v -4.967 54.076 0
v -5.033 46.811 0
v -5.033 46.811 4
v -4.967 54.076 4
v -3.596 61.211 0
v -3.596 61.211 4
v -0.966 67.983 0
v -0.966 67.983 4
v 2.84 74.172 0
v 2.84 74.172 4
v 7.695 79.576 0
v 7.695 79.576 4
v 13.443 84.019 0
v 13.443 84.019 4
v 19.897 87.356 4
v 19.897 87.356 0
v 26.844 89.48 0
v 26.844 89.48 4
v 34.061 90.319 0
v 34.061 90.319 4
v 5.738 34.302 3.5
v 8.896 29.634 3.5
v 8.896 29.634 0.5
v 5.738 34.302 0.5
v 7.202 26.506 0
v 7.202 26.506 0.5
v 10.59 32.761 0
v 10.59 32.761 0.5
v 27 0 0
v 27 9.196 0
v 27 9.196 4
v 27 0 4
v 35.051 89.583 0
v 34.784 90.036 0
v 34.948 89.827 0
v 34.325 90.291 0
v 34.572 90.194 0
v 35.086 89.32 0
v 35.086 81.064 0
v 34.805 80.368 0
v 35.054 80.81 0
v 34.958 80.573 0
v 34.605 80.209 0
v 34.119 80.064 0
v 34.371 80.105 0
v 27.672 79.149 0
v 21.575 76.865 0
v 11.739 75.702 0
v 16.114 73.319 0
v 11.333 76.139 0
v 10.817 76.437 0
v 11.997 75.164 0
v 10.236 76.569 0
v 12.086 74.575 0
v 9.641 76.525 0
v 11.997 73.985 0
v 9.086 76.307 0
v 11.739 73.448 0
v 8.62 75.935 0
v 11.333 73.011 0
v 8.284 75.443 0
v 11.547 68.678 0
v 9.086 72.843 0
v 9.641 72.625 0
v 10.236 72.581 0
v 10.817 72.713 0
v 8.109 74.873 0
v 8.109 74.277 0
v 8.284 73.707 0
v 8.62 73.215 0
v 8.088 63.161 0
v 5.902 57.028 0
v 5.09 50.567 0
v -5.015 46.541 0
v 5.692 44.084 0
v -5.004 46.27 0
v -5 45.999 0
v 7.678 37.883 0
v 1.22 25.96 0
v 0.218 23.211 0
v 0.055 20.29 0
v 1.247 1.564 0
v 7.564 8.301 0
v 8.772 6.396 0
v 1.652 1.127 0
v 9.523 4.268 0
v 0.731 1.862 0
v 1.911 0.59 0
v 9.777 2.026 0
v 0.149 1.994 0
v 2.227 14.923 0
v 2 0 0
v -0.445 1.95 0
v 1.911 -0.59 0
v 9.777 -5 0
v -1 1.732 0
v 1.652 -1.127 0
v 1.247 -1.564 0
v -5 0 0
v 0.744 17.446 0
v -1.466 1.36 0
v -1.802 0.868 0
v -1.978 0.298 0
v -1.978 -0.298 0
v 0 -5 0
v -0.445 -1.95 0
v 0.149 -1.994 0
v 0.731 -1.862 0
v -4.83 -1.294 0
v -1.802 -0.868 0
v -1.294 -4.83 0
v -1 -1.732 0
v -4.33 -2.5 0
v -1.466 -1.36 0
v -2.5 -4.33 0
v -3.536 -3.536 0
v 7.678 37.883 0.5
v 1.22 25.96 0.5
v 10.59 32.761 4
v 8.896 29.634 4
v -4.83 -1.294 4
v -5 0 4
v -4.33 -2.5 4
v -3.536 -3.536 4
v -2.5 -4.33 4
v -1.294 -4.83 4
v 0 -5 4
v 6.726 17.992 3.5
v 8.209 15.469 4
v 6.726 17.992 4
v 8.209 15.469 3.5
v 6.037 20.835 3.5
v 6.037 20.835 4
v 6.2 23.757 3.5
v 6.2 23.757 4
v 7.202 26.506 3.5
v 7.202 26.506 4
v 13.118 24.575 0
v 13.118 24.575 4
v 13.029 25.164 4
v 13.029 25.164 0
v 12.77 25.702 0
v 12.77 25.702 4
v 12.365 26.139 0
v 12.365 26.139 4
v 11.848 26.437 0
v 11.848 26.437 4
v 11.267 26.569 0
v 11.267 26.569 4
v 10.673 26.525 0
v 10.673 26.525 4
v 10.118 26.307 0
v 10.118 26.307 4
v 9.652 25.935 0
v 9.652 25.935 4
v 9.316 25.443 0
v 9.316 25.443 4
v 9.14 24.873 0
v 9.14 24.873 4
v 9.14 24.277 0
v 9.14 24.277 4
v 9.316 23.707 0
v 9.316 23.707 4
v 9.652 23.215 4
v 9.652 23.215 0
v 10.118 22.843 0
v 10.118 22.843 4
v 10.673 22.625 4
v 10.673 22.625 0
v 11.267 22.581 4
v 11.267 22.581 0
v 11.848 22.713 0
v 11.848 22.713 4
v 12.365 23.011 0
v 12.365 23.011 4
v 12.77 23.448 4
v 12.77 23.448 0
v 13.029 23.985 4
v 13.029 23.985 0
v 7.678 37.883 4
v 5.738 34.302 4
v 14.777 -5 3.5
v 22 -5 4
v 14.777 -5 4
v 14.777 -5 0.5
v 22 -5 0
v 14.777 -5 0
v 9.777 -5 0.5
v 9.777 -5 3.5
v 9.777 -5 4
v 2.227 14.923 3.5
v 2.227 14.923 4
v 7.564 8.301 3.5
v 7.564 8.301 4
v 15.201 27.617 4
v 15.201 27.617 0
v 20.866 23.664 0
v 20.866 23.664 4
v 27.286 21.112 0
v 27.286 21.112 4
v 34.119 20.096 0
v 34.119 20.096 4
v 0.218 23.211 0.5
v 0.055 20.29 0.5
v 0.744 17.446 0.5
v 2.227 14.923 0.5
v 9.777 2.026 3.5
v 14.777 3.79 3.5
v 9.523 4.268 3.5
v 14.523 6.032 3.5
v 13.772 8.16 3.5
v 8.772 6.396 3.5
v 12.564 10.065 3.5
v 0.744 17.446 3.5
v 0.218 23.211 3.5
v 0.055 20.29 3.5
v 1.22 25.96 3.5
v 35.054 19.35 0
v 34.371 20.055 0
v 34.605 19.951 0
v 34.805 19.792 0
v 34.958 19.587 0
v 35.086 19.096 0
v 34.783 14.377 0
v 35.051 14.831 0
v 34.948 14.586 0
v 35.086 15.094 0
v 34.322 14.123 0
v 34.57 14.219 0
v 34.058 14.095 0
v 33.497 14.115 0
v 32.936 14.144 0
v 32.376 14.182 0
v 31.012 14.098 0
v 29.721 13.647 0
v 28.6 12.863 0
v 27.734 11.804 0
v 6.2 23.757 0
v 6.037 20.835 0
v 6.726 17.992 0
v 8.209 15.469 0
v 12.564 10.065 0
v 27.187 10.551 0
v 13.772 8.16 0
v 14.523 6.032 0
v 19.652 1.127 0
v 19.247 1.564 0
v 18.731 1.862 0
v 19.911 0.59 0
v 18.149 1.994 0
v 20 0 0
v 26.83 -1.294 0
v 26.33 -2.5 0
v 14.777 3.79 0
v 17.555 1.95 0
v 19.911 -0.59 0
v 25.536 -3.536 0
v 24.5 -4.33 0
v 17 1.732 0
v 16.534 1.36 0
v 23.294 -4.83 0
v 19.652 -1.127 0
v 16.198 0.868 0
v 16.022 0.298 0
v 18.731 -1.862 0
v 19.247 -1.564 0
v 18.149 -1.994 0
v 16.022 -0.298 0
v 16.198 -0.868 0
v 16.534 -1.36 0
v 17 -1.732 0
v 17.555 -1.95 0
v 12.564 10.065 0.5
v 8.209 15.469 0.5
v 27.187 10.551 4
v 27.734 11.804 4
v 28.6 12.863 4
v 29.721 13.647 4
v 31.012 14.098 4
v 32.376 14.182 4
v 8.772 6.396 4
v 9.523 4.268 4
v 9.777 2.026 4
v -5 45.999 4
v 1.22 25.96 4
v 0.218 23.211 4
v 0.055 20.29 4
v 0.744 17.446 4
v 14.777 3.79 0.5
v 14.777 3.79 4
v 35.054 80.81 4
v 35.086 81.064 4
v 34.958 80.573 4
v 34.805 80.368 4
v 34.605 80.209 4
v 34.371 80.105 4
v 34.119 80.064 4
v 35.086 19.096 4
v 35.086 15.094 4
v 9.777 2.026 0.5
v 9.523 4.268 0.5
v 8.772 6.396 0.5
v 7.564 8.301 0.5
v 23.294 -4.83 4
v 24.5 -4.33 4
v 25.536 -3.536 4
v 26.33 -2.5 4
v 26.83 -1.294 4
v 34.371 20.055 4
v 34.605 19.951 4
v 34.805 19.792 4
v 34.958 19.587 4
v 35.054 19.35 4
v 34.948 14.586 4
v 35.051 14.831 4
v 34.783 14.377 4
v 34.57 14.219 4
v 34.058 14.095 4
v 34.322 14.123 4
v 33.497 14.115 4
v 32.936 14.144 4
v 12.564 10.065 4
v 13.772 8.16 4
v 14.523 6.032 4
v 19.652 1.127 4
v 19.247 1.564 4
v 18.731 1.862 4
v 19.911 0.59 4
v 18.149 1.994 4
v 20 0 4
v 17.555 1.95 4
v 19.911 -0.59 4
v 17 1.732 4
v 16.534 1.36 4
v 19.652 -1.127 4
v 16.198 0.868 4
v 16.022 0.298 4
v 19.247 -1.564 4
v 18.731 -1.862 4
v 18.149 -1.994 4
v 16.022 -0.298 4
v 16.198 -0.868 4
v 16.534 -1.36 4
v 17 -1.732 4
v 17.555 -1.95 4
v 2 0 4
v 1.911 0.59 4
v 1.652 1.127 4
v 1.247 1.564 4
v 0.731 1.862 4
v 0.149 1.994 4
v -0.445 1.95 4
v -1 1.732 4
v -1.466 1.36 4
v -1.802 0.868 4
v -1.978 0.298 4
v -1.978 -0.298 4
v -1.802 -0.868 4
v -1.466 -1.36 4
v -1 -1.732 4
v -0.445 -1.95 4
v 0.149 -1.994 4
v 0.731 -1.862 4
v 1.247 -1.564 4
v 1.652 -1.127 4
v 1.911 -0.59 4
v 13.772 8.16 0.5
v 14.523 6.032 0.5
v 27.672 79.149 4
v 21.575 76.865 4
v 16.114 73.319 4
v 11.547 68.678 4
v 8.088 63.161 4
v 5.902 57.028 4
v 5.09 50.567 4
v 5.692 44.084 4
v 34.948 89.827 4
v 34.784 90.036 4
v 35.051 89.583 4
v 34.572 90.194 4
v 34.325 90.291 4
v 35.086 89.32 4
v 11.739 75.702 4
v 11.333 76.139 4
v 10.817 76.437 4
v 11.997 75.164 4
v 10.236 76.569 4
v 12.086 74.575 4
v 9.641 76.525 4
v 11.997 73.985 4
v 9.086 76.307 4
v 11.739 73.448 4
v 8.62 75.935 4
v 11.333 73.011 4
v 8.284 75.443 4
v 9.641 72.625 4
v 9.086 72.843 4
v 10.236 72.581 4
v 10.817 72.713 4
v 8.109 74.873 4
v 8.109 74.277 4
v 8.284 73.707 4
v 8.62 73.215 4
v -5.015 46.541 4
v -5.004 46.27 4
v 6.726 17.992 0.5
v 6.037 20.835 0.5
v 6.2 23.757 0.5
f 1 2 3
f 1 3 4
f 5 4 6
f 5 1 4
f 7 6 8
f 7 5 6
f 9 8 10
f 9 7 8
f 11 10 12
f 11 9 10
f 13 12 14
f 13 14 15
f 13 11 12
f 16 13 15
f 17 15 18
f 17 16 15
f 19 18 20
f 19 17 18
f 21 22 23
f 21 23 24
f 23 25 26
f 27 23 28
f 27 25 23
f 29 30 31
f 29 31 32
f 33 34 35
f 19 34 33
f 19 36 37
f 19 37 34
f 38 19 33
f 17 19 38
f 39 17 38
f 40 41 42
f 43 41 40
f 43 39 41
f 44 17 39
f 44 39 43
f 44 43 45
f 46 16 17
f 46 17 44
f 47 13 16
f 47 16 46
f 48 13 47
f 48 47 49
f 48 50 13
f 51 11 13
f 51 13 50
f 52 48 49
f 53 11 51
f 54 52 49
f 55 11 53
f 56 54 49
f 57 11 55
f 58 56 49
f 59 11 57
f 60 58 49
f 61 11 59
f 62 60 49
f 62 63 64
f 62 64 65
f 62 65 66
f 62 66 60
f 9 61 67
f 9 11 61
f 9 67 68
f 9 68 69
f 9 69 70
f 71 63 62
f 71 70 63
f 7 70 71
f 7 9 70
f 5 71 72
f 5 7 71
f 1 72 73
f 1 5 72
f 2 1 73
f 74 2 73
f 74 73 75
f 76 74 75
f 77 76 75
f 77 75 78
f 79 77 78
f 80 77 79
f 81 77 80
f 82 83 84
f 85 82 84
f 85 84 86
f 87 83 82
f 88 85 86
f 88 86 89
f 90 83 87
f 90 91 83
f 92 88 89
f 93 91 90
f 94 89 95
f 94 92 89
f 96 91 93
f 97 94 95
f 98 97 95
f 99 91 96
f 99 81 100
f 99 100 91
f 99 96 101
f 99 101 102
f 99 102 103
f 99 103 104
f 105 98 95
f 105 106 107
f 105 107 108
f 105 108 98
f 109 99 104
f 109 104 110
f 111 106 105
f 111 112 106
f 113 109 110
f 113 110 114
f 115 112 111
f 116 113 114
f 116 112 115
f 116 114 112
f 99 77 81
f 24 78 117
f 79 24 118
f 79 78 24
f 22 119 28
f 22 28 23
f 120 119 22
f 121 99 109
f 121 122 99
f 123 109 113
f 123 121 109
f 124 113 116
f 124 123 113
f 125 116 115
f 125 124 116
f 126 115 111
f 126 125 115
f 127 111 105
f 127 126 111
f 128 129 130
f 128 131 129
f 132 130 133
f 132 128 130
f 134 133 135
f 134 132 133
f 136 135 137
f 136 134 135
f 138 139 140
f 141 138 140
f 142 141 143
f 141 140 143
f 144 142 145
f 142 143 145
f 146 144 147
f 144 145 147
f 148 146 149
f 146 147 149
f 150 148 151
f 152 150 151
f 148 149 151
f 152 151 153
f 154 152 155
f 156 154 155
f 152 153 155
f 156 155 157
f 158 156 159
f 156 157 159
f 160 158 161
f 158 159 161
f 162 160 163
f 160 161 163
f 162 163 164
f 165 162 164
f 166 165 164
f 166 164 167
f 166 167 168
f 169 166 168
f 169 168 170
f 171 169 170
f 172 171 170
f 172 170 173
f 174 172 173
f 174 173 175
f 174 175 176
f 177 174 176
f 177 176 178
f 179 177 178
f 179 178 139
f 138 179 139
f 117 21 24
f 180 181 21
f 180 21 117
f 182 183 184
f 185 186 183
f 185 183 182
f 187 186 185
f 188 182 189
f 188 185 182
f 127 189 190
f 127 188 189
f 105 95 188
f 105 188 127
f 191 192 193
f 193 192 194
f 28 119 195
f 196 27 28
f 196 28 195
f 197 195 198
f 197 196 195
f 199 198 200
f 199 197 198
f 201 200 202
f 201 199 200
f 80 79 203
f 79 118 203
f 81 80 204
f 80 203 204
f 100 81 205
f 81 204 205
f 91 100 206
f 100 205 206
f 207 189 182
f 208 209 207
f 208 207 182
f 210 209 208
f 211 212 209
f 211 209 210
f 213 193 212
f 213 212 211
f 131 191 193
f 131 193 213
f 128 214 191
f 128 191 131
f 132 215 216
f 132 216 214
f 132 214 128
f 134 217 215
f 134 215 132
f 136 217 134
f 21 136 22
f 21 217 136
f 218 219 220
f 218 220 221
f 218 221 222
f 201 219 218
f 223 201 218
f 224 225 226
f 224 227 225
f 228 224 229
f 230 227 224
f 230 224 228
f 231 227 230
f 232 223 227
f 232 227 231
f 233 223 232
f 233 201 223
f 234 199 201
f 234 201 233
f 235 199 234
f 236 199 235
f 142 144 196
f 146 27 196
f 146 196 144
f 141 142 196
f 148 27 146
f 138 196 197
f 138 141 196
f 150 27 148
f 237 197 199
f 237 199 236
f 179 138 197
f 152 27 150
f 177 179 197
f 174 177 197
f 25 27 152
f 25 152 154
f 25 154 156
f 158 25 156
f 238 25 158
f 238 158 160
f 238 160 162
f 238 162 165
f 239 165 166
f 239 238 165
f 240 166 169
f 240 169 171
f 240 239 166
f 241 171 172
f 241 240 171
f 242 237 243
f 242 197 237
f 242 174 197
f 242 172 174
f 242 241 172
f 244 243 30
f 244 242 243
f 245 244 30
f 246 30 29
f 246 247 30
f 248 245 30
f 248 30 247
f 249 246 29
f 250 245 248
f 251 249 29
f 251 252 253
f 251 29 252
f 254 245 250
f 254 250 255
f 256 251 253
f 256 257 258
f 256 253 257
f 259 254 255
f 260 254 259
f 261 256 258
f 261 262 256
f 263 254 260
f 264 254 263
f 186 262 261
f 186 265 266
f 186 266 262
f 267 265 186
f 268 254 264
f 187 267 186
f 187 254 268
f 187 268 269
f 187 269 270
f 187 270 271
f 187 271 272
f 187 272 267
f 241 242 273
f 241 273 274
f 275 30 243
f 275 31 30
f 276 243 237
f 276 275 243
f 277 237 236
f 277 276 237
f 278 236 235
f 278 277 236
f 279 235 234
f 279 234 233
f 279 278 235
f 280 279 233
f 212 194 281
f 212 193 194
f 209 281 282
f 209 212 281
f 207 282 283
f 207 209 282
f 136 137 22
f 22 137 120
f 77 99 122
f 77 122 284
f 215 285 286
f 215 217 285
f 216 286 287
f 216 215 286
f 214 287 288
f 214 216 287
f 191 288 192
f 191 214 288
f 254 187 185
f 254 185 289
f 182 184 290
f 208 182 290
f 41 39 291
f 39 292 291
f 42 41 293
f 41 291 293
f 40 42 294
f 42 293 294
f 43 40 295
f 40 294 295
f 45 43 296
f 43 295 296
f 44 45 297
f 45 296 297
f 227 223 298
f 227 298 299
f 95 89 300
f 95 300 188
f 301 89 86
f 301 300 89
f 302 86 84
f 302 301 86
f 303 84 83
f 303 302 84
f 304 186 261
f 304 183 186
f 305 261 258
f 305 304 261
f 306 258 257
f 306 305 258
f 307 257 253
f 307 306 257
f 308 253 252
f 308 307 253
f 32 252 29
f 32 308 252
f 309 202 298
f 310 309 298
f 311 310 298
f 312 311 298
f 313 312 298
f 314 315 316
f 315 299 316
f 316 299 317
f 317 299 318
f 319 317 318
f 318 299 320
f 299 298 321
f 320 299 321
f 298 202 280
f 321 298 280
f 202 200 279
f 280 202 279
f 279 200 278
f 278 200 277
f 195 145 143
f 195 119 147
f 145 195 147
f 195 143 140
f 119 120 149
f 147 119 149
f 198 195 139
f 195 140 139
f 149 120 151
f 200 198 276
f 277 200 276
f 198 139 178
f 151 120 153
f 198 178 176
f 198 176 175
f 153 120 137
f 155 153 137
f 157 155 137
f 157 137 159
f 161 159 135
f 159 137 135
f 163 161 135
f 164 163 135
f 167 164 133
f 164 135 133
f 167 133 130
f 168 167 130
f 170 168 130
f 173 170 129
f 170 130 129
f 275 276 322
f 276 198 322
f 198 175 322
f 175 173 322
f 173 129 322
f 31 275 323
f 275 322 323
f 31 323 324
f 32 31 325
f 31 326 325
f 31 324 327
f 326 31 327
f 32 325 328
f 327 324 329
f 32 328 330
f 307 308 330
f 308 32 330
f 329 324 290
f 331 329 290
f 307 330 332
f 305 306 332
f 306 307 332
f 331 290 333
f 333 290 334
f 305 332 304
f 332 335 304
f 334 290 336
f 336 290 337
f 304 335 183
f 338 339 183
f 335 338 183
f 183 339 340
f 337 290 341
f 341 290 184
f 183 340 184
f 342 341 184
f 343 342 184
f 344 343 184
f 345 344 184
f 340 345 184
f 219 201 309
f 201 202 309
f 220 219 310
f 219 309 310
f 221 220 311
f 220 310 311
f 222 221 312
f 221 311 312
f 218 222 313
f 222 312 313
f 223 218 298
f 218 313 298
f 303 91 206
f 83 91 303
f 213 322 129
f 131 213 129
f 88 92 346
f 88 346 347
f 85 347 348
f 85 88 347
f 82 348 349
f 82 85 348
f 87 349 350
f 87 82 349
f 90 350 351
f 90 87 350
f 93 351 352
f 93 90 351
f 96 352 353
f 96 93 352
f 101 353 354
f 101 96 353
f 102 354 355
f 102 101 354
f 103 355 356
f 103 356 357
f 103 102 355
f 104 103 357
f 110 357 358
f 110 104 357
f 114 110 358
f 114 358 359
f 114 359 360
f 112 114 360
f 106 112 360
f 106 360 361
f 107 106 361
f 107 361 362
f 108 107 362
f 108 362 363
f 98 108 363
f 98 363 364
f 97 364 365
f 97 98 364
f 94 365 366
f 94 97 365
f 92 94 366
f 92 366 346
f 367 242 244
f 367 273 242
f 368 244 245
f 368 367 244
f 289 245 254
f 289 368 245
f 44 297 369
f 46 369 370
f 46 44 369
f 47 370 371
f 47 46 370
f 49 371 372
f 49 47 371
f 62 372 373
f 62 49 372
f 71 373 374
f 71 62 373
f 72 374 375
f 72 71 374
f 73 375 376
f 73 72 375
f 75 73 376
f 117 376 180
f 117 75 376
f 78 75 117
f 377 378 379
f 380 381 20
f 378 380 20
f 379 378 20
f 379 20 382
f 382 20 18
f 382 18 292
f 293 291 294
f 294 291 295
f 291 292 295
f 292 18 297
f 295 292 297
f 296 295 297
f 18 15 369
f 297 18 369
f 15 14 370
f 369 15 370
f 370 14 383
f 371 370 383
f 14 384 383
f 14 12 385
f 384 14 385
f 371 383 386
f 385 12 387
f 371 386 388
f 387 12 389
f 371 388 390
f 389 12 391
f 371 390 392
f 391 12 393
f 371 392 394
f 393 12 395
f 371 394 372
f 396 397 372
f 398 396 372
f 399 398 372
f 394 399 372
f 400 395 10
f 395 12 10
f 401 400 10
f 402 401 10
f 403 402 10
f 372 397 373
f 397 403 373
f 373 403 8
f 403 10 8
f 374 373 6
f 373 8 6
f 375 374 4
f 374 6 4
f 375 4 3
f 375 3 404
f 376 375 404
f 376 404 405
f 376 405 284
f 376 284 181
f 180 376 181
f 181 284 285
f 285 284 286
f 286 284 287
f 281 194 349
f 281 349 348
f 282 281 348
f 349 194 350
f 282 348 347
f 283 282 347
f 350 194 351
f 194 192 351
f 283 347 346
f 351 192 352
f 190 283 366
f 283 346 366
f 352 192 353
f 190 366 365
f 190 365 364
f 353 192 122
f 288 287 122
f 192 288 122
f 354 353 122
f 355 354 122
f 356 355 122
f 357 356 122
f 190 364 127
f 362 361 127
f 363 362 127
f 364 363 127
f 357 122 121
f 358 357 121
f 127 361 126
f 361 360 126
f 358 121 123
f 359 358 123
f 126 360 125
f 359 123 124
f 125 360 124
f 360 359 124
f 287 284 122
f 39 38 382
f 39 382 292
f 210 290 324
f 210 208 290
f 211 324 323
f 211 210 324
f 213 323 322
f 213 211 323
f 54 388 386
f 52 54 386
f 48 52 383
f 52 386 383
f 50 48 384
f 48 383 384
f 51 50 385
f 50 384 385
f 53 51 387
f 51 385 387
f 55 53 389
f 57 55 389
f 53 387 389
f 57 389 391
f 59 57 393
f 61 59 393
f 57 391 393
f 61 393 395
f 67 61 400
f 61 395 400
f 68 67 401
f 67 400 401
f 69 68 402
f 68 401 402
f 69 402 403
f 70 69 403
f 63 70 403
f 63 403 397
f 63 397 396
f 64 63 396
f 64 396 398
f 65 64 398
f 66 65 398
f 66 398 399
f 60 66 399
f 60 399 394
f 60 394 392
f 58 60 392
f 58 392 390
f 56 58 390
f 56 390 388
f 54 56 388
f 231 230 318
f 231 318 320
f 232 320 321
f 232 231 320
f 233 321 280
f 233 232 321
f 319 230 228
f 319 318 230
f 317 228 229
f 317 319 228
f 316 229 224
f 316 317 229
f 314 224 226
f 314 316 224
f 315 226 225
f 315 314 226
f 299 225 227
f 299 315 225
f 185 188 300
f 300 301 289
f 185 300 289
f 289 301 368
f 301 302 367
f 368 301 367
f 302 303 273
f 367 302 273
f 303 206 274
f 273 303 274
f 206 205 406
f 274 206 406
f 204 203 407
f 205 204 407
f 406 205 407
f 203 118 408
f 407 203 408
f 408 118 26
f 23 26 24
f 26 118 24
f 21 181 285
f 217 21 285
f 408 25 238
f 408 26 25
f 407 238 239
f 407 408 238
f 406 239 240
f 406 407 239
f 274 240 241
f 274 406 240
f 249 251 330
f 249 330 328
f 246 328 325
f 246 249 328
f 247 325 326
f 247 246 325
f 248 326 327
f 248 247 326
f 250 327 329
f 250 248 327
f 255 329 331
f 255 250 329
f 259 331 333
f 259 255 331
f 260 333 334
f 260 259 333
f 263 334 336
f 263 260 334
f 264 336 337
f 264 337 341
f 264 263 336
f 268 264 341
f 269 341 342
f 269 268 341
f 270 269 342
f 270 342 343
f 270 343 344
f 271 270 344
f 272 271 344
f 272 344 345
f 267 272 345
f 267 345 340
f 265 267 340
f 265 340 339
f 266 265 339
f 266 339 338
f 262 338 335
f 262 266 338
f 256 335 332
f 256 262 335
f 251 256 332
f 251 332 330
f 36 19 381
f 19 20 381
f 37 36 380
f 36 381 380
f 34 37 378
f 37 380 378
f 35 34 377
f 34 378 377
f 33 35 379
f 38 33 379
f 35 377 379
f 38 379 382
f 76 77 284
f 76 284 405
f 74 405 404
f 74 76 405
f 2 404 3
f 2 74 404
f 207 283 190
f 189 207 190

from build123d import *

# Parameters (mm, degrees)
SKETCH1_R               = 2
BOSS_EXTRUDE1_DEPTH     = 4
FILLET10_R              = 1
FILLET11_R              = 10
FILLET12_R              = 5
FILLET13_R              = 5
FILLET14_R              = 5
SKETCH2_R               = 2
CUT_EXTRUDE1_DEPTH      = 20
CUT_EXTRUDE2_DEPTH      = 0.5
FILLET15_R              = 10
CUT_EXTRUDE3_DEPTH      = 97.958369289
CUT_EXTRUDE3_DEPTH_BACK = 97.958369289
FILLET15_OF_MIRROR1_R   = 10


with BuildPart() as part:
    # Sketch1 → Boss-Extrude1 (new body)
    with BuildSketch(Plane.XY):
        with BuildLine():
            Line((-5, -5), (-5, 46.428571429))
            ThreePointArc((-5, 46.428571429), (5.360662074, 77.221028176), (35.086282243, 90.332329282))
            Line((35.086282243, 90.332329282), (35.086282243, 80.08008038))
            ThreePointArc((35.086282243, 80.08008038), (5.086282243, 50.08008038), (35.086282243, 20.08008038))
            Line((35.086282243, 20.08008038), (35.086282243, 14.08008038))
            ThreePointArc((35.086282243, 14.08008038), (31.017062028, 14.31079961), (27, 15))
            Line((27, 15), (27, -5))
            Line((27, -5), (-5, -5))
        make_face()
        Circle(SKETCH1_R, mode=Mode.SUBTRACT)
        with Locations((18, 0)):
            Circle(SKETCH1_R, mode=Mode.SUBTRACT)
    extrude(amount=BOSS_EXTRUDE1_DEPTH)

    # Fillet10
    fillet10_edges = [part.edges().sort_by_distance(p)[0] for p in [
        (35.086282243, 90.332329282, 2),
        (35.086282243, 80.08008038, 2),
        (35.086282243, 20.08008038, 2),
        (35.086282243, 14.08008038, 2),
    ]]
    fillet(fillet10_edges, radius=FILLET10_R)

    # Fillet11
    # the kernel refuses this fillet: 10 mm, written as the material it adds along each edge
    with BuildSketch(Plane(origin=(-5, 46.428571429, 0), x_dir=(-0.08596186737445177, 0.996298427860597, 0), z_dir=(0, 0, 1))) as fillet11_piece_1:
        with BuildLine():
            CenterArc((0.431926178, 9.999886119), FILLET11_R, 265.068661729, 4.657897264)
            Line((-0.427692496, 0.03690184), (0, 0))
            ThreePointArc((0, 0), (0.19210095, 0.000458397), (0.3842019, 0))
        make_face()
    extrude(amount=4)

    # Fillet12
    fillet12_edges = [part.edges().sort_by_distance(p)[0] for p in [
        (-5, -5, 2),
    ]]
    fillet(fillet12_edges, radius=FILLET12_R)

    # Fillet13
    fillet13_edges = [part.edges().sort_by_distance(p)[0] for p in [
        (27, -5, 2),
    ]]
    fillet(fillet13_edges, radius=FILLET13_R)

    # Fillet14
    fillet14_edges = [part.edges().sort_by_distance(p)[0] for p in [
        (27, 15, 2),
    ]]
    fillet(fillet14_edges, radius=FILLET14_R)

    # Sketch2 → Cut-Extrude1 (cut)
    with BuildSketch(Plane.XY.offset(4)):
        with Locations((10.086282243, 74.574977808)):
            Circle(SKETCH2_R)
        with Locations((11.117766586, 24.574977808)):
            Circle(SKETCH2_R)
    extrude(amount=-CUT_EXTRUDE1_DEPTH, mode=Mode.SUBTRACT)

    # Sketch3 → Cut-Extrude2 (cut)
    with BuildSketch(Plane(origin=(0, 0, 0), x_dir=(-1, 0, 0), z_dir=(0, 0, -1))):
        with BuildLine():
            Line((-14.777268977, -5), (-14.777268977, 7.317916248))
            Line((-14.777268977, 7.317916248), (-4.032042708, 20.652353666))
            Line((-4.032042708, 20.652353666), (-10.590052553, 32.761456562))
            ThreePointArc((-10.590052553, 32.761456562), (-9.00780857, 35.250609355), (-7.677638466, 37.883103447))
            Line((-7.677638466, 37.883103447), (1.949636164, 20.106725877))
            Line((1.949636164, 20.106725877), (-9.777268977, 5.554060462))
            Line((-9.777268977, 5.554060462), (-9.777268977, -5))
            Line((-9.777268977, -5), (-14.777268977, -5))
        make_face()
    cut_extrude2 = extrude(amount=-CUT_EXTRUDE2_DEPTH, mode=Mode.SUBTRACT)

    # Fillet15
    fillet15_edges = [part.edges().sort_by_distance(p)[0] for p in [
        (14.777268977, 7.317916248, 0.25),
        (4.032042708, 20.652353666, 0.25),
        (-1.949636164, 20.106725877, 0.25),
        (9.777268977, 5.554060462, 0.25),
    ]]
    fillet(fillet15_edges, radius=FILLET15_R)

    # Sketch4 → Cut-Extrude3 (cut, two sides: drawn at the far end of the back side and taken through both)
    with BuildSketch(Plane(origin=(0, 0, 0.5), x_dir=(-1, 0, 0), z_dir=(0, 0, -1)).offset(-CUT_EXTRUDE3_DEPTH_BACK)):
        with BuildLine():
            Line((-10.590052553, 32.761456562), (-8.89610131, 29.63364334))
            Line((-8.89610131, 29.63364334), (-5.738375915, 34.302332705))
            Line((-5.738375915, 34.302332705), (-7.677638466, 37.883103447))
            ThreePointArc((-7.677638466, 37.883103447), (-9.00780857, 35.250609355), (-10.590052553, 32.761456562))
        make_face()
    extrude(amount=CUT_EXTRUDE3_DEPTH + CUT_EXTRUDE3_DEPTH_BACK, mode=Mode.SUBTRACT)

    # Mirror1: Cut-Extrude2 across plane
    add(cut_extrude2.mirror(Plane.XY.offset(2)), mode=Mode.SUBTRACT)

    # Fillet15 of Mirror1
    fillet15_of_mirror1_edges = [part.edges().sort_by_distance(p)[0] for p in [
        (14.777268977, 7.317916248, 3.75),
        (4.032042708, 20.652353666, 3.75),
        (-1.949636164, 20.106725877, 3.75),
        (9.777268977, 5.554060462, 3.75),
    ]]
    fillet(fillet15_of_mirror1_edges, radius=FILLET15_OF_MIRROR1_R)


solid = part.part
